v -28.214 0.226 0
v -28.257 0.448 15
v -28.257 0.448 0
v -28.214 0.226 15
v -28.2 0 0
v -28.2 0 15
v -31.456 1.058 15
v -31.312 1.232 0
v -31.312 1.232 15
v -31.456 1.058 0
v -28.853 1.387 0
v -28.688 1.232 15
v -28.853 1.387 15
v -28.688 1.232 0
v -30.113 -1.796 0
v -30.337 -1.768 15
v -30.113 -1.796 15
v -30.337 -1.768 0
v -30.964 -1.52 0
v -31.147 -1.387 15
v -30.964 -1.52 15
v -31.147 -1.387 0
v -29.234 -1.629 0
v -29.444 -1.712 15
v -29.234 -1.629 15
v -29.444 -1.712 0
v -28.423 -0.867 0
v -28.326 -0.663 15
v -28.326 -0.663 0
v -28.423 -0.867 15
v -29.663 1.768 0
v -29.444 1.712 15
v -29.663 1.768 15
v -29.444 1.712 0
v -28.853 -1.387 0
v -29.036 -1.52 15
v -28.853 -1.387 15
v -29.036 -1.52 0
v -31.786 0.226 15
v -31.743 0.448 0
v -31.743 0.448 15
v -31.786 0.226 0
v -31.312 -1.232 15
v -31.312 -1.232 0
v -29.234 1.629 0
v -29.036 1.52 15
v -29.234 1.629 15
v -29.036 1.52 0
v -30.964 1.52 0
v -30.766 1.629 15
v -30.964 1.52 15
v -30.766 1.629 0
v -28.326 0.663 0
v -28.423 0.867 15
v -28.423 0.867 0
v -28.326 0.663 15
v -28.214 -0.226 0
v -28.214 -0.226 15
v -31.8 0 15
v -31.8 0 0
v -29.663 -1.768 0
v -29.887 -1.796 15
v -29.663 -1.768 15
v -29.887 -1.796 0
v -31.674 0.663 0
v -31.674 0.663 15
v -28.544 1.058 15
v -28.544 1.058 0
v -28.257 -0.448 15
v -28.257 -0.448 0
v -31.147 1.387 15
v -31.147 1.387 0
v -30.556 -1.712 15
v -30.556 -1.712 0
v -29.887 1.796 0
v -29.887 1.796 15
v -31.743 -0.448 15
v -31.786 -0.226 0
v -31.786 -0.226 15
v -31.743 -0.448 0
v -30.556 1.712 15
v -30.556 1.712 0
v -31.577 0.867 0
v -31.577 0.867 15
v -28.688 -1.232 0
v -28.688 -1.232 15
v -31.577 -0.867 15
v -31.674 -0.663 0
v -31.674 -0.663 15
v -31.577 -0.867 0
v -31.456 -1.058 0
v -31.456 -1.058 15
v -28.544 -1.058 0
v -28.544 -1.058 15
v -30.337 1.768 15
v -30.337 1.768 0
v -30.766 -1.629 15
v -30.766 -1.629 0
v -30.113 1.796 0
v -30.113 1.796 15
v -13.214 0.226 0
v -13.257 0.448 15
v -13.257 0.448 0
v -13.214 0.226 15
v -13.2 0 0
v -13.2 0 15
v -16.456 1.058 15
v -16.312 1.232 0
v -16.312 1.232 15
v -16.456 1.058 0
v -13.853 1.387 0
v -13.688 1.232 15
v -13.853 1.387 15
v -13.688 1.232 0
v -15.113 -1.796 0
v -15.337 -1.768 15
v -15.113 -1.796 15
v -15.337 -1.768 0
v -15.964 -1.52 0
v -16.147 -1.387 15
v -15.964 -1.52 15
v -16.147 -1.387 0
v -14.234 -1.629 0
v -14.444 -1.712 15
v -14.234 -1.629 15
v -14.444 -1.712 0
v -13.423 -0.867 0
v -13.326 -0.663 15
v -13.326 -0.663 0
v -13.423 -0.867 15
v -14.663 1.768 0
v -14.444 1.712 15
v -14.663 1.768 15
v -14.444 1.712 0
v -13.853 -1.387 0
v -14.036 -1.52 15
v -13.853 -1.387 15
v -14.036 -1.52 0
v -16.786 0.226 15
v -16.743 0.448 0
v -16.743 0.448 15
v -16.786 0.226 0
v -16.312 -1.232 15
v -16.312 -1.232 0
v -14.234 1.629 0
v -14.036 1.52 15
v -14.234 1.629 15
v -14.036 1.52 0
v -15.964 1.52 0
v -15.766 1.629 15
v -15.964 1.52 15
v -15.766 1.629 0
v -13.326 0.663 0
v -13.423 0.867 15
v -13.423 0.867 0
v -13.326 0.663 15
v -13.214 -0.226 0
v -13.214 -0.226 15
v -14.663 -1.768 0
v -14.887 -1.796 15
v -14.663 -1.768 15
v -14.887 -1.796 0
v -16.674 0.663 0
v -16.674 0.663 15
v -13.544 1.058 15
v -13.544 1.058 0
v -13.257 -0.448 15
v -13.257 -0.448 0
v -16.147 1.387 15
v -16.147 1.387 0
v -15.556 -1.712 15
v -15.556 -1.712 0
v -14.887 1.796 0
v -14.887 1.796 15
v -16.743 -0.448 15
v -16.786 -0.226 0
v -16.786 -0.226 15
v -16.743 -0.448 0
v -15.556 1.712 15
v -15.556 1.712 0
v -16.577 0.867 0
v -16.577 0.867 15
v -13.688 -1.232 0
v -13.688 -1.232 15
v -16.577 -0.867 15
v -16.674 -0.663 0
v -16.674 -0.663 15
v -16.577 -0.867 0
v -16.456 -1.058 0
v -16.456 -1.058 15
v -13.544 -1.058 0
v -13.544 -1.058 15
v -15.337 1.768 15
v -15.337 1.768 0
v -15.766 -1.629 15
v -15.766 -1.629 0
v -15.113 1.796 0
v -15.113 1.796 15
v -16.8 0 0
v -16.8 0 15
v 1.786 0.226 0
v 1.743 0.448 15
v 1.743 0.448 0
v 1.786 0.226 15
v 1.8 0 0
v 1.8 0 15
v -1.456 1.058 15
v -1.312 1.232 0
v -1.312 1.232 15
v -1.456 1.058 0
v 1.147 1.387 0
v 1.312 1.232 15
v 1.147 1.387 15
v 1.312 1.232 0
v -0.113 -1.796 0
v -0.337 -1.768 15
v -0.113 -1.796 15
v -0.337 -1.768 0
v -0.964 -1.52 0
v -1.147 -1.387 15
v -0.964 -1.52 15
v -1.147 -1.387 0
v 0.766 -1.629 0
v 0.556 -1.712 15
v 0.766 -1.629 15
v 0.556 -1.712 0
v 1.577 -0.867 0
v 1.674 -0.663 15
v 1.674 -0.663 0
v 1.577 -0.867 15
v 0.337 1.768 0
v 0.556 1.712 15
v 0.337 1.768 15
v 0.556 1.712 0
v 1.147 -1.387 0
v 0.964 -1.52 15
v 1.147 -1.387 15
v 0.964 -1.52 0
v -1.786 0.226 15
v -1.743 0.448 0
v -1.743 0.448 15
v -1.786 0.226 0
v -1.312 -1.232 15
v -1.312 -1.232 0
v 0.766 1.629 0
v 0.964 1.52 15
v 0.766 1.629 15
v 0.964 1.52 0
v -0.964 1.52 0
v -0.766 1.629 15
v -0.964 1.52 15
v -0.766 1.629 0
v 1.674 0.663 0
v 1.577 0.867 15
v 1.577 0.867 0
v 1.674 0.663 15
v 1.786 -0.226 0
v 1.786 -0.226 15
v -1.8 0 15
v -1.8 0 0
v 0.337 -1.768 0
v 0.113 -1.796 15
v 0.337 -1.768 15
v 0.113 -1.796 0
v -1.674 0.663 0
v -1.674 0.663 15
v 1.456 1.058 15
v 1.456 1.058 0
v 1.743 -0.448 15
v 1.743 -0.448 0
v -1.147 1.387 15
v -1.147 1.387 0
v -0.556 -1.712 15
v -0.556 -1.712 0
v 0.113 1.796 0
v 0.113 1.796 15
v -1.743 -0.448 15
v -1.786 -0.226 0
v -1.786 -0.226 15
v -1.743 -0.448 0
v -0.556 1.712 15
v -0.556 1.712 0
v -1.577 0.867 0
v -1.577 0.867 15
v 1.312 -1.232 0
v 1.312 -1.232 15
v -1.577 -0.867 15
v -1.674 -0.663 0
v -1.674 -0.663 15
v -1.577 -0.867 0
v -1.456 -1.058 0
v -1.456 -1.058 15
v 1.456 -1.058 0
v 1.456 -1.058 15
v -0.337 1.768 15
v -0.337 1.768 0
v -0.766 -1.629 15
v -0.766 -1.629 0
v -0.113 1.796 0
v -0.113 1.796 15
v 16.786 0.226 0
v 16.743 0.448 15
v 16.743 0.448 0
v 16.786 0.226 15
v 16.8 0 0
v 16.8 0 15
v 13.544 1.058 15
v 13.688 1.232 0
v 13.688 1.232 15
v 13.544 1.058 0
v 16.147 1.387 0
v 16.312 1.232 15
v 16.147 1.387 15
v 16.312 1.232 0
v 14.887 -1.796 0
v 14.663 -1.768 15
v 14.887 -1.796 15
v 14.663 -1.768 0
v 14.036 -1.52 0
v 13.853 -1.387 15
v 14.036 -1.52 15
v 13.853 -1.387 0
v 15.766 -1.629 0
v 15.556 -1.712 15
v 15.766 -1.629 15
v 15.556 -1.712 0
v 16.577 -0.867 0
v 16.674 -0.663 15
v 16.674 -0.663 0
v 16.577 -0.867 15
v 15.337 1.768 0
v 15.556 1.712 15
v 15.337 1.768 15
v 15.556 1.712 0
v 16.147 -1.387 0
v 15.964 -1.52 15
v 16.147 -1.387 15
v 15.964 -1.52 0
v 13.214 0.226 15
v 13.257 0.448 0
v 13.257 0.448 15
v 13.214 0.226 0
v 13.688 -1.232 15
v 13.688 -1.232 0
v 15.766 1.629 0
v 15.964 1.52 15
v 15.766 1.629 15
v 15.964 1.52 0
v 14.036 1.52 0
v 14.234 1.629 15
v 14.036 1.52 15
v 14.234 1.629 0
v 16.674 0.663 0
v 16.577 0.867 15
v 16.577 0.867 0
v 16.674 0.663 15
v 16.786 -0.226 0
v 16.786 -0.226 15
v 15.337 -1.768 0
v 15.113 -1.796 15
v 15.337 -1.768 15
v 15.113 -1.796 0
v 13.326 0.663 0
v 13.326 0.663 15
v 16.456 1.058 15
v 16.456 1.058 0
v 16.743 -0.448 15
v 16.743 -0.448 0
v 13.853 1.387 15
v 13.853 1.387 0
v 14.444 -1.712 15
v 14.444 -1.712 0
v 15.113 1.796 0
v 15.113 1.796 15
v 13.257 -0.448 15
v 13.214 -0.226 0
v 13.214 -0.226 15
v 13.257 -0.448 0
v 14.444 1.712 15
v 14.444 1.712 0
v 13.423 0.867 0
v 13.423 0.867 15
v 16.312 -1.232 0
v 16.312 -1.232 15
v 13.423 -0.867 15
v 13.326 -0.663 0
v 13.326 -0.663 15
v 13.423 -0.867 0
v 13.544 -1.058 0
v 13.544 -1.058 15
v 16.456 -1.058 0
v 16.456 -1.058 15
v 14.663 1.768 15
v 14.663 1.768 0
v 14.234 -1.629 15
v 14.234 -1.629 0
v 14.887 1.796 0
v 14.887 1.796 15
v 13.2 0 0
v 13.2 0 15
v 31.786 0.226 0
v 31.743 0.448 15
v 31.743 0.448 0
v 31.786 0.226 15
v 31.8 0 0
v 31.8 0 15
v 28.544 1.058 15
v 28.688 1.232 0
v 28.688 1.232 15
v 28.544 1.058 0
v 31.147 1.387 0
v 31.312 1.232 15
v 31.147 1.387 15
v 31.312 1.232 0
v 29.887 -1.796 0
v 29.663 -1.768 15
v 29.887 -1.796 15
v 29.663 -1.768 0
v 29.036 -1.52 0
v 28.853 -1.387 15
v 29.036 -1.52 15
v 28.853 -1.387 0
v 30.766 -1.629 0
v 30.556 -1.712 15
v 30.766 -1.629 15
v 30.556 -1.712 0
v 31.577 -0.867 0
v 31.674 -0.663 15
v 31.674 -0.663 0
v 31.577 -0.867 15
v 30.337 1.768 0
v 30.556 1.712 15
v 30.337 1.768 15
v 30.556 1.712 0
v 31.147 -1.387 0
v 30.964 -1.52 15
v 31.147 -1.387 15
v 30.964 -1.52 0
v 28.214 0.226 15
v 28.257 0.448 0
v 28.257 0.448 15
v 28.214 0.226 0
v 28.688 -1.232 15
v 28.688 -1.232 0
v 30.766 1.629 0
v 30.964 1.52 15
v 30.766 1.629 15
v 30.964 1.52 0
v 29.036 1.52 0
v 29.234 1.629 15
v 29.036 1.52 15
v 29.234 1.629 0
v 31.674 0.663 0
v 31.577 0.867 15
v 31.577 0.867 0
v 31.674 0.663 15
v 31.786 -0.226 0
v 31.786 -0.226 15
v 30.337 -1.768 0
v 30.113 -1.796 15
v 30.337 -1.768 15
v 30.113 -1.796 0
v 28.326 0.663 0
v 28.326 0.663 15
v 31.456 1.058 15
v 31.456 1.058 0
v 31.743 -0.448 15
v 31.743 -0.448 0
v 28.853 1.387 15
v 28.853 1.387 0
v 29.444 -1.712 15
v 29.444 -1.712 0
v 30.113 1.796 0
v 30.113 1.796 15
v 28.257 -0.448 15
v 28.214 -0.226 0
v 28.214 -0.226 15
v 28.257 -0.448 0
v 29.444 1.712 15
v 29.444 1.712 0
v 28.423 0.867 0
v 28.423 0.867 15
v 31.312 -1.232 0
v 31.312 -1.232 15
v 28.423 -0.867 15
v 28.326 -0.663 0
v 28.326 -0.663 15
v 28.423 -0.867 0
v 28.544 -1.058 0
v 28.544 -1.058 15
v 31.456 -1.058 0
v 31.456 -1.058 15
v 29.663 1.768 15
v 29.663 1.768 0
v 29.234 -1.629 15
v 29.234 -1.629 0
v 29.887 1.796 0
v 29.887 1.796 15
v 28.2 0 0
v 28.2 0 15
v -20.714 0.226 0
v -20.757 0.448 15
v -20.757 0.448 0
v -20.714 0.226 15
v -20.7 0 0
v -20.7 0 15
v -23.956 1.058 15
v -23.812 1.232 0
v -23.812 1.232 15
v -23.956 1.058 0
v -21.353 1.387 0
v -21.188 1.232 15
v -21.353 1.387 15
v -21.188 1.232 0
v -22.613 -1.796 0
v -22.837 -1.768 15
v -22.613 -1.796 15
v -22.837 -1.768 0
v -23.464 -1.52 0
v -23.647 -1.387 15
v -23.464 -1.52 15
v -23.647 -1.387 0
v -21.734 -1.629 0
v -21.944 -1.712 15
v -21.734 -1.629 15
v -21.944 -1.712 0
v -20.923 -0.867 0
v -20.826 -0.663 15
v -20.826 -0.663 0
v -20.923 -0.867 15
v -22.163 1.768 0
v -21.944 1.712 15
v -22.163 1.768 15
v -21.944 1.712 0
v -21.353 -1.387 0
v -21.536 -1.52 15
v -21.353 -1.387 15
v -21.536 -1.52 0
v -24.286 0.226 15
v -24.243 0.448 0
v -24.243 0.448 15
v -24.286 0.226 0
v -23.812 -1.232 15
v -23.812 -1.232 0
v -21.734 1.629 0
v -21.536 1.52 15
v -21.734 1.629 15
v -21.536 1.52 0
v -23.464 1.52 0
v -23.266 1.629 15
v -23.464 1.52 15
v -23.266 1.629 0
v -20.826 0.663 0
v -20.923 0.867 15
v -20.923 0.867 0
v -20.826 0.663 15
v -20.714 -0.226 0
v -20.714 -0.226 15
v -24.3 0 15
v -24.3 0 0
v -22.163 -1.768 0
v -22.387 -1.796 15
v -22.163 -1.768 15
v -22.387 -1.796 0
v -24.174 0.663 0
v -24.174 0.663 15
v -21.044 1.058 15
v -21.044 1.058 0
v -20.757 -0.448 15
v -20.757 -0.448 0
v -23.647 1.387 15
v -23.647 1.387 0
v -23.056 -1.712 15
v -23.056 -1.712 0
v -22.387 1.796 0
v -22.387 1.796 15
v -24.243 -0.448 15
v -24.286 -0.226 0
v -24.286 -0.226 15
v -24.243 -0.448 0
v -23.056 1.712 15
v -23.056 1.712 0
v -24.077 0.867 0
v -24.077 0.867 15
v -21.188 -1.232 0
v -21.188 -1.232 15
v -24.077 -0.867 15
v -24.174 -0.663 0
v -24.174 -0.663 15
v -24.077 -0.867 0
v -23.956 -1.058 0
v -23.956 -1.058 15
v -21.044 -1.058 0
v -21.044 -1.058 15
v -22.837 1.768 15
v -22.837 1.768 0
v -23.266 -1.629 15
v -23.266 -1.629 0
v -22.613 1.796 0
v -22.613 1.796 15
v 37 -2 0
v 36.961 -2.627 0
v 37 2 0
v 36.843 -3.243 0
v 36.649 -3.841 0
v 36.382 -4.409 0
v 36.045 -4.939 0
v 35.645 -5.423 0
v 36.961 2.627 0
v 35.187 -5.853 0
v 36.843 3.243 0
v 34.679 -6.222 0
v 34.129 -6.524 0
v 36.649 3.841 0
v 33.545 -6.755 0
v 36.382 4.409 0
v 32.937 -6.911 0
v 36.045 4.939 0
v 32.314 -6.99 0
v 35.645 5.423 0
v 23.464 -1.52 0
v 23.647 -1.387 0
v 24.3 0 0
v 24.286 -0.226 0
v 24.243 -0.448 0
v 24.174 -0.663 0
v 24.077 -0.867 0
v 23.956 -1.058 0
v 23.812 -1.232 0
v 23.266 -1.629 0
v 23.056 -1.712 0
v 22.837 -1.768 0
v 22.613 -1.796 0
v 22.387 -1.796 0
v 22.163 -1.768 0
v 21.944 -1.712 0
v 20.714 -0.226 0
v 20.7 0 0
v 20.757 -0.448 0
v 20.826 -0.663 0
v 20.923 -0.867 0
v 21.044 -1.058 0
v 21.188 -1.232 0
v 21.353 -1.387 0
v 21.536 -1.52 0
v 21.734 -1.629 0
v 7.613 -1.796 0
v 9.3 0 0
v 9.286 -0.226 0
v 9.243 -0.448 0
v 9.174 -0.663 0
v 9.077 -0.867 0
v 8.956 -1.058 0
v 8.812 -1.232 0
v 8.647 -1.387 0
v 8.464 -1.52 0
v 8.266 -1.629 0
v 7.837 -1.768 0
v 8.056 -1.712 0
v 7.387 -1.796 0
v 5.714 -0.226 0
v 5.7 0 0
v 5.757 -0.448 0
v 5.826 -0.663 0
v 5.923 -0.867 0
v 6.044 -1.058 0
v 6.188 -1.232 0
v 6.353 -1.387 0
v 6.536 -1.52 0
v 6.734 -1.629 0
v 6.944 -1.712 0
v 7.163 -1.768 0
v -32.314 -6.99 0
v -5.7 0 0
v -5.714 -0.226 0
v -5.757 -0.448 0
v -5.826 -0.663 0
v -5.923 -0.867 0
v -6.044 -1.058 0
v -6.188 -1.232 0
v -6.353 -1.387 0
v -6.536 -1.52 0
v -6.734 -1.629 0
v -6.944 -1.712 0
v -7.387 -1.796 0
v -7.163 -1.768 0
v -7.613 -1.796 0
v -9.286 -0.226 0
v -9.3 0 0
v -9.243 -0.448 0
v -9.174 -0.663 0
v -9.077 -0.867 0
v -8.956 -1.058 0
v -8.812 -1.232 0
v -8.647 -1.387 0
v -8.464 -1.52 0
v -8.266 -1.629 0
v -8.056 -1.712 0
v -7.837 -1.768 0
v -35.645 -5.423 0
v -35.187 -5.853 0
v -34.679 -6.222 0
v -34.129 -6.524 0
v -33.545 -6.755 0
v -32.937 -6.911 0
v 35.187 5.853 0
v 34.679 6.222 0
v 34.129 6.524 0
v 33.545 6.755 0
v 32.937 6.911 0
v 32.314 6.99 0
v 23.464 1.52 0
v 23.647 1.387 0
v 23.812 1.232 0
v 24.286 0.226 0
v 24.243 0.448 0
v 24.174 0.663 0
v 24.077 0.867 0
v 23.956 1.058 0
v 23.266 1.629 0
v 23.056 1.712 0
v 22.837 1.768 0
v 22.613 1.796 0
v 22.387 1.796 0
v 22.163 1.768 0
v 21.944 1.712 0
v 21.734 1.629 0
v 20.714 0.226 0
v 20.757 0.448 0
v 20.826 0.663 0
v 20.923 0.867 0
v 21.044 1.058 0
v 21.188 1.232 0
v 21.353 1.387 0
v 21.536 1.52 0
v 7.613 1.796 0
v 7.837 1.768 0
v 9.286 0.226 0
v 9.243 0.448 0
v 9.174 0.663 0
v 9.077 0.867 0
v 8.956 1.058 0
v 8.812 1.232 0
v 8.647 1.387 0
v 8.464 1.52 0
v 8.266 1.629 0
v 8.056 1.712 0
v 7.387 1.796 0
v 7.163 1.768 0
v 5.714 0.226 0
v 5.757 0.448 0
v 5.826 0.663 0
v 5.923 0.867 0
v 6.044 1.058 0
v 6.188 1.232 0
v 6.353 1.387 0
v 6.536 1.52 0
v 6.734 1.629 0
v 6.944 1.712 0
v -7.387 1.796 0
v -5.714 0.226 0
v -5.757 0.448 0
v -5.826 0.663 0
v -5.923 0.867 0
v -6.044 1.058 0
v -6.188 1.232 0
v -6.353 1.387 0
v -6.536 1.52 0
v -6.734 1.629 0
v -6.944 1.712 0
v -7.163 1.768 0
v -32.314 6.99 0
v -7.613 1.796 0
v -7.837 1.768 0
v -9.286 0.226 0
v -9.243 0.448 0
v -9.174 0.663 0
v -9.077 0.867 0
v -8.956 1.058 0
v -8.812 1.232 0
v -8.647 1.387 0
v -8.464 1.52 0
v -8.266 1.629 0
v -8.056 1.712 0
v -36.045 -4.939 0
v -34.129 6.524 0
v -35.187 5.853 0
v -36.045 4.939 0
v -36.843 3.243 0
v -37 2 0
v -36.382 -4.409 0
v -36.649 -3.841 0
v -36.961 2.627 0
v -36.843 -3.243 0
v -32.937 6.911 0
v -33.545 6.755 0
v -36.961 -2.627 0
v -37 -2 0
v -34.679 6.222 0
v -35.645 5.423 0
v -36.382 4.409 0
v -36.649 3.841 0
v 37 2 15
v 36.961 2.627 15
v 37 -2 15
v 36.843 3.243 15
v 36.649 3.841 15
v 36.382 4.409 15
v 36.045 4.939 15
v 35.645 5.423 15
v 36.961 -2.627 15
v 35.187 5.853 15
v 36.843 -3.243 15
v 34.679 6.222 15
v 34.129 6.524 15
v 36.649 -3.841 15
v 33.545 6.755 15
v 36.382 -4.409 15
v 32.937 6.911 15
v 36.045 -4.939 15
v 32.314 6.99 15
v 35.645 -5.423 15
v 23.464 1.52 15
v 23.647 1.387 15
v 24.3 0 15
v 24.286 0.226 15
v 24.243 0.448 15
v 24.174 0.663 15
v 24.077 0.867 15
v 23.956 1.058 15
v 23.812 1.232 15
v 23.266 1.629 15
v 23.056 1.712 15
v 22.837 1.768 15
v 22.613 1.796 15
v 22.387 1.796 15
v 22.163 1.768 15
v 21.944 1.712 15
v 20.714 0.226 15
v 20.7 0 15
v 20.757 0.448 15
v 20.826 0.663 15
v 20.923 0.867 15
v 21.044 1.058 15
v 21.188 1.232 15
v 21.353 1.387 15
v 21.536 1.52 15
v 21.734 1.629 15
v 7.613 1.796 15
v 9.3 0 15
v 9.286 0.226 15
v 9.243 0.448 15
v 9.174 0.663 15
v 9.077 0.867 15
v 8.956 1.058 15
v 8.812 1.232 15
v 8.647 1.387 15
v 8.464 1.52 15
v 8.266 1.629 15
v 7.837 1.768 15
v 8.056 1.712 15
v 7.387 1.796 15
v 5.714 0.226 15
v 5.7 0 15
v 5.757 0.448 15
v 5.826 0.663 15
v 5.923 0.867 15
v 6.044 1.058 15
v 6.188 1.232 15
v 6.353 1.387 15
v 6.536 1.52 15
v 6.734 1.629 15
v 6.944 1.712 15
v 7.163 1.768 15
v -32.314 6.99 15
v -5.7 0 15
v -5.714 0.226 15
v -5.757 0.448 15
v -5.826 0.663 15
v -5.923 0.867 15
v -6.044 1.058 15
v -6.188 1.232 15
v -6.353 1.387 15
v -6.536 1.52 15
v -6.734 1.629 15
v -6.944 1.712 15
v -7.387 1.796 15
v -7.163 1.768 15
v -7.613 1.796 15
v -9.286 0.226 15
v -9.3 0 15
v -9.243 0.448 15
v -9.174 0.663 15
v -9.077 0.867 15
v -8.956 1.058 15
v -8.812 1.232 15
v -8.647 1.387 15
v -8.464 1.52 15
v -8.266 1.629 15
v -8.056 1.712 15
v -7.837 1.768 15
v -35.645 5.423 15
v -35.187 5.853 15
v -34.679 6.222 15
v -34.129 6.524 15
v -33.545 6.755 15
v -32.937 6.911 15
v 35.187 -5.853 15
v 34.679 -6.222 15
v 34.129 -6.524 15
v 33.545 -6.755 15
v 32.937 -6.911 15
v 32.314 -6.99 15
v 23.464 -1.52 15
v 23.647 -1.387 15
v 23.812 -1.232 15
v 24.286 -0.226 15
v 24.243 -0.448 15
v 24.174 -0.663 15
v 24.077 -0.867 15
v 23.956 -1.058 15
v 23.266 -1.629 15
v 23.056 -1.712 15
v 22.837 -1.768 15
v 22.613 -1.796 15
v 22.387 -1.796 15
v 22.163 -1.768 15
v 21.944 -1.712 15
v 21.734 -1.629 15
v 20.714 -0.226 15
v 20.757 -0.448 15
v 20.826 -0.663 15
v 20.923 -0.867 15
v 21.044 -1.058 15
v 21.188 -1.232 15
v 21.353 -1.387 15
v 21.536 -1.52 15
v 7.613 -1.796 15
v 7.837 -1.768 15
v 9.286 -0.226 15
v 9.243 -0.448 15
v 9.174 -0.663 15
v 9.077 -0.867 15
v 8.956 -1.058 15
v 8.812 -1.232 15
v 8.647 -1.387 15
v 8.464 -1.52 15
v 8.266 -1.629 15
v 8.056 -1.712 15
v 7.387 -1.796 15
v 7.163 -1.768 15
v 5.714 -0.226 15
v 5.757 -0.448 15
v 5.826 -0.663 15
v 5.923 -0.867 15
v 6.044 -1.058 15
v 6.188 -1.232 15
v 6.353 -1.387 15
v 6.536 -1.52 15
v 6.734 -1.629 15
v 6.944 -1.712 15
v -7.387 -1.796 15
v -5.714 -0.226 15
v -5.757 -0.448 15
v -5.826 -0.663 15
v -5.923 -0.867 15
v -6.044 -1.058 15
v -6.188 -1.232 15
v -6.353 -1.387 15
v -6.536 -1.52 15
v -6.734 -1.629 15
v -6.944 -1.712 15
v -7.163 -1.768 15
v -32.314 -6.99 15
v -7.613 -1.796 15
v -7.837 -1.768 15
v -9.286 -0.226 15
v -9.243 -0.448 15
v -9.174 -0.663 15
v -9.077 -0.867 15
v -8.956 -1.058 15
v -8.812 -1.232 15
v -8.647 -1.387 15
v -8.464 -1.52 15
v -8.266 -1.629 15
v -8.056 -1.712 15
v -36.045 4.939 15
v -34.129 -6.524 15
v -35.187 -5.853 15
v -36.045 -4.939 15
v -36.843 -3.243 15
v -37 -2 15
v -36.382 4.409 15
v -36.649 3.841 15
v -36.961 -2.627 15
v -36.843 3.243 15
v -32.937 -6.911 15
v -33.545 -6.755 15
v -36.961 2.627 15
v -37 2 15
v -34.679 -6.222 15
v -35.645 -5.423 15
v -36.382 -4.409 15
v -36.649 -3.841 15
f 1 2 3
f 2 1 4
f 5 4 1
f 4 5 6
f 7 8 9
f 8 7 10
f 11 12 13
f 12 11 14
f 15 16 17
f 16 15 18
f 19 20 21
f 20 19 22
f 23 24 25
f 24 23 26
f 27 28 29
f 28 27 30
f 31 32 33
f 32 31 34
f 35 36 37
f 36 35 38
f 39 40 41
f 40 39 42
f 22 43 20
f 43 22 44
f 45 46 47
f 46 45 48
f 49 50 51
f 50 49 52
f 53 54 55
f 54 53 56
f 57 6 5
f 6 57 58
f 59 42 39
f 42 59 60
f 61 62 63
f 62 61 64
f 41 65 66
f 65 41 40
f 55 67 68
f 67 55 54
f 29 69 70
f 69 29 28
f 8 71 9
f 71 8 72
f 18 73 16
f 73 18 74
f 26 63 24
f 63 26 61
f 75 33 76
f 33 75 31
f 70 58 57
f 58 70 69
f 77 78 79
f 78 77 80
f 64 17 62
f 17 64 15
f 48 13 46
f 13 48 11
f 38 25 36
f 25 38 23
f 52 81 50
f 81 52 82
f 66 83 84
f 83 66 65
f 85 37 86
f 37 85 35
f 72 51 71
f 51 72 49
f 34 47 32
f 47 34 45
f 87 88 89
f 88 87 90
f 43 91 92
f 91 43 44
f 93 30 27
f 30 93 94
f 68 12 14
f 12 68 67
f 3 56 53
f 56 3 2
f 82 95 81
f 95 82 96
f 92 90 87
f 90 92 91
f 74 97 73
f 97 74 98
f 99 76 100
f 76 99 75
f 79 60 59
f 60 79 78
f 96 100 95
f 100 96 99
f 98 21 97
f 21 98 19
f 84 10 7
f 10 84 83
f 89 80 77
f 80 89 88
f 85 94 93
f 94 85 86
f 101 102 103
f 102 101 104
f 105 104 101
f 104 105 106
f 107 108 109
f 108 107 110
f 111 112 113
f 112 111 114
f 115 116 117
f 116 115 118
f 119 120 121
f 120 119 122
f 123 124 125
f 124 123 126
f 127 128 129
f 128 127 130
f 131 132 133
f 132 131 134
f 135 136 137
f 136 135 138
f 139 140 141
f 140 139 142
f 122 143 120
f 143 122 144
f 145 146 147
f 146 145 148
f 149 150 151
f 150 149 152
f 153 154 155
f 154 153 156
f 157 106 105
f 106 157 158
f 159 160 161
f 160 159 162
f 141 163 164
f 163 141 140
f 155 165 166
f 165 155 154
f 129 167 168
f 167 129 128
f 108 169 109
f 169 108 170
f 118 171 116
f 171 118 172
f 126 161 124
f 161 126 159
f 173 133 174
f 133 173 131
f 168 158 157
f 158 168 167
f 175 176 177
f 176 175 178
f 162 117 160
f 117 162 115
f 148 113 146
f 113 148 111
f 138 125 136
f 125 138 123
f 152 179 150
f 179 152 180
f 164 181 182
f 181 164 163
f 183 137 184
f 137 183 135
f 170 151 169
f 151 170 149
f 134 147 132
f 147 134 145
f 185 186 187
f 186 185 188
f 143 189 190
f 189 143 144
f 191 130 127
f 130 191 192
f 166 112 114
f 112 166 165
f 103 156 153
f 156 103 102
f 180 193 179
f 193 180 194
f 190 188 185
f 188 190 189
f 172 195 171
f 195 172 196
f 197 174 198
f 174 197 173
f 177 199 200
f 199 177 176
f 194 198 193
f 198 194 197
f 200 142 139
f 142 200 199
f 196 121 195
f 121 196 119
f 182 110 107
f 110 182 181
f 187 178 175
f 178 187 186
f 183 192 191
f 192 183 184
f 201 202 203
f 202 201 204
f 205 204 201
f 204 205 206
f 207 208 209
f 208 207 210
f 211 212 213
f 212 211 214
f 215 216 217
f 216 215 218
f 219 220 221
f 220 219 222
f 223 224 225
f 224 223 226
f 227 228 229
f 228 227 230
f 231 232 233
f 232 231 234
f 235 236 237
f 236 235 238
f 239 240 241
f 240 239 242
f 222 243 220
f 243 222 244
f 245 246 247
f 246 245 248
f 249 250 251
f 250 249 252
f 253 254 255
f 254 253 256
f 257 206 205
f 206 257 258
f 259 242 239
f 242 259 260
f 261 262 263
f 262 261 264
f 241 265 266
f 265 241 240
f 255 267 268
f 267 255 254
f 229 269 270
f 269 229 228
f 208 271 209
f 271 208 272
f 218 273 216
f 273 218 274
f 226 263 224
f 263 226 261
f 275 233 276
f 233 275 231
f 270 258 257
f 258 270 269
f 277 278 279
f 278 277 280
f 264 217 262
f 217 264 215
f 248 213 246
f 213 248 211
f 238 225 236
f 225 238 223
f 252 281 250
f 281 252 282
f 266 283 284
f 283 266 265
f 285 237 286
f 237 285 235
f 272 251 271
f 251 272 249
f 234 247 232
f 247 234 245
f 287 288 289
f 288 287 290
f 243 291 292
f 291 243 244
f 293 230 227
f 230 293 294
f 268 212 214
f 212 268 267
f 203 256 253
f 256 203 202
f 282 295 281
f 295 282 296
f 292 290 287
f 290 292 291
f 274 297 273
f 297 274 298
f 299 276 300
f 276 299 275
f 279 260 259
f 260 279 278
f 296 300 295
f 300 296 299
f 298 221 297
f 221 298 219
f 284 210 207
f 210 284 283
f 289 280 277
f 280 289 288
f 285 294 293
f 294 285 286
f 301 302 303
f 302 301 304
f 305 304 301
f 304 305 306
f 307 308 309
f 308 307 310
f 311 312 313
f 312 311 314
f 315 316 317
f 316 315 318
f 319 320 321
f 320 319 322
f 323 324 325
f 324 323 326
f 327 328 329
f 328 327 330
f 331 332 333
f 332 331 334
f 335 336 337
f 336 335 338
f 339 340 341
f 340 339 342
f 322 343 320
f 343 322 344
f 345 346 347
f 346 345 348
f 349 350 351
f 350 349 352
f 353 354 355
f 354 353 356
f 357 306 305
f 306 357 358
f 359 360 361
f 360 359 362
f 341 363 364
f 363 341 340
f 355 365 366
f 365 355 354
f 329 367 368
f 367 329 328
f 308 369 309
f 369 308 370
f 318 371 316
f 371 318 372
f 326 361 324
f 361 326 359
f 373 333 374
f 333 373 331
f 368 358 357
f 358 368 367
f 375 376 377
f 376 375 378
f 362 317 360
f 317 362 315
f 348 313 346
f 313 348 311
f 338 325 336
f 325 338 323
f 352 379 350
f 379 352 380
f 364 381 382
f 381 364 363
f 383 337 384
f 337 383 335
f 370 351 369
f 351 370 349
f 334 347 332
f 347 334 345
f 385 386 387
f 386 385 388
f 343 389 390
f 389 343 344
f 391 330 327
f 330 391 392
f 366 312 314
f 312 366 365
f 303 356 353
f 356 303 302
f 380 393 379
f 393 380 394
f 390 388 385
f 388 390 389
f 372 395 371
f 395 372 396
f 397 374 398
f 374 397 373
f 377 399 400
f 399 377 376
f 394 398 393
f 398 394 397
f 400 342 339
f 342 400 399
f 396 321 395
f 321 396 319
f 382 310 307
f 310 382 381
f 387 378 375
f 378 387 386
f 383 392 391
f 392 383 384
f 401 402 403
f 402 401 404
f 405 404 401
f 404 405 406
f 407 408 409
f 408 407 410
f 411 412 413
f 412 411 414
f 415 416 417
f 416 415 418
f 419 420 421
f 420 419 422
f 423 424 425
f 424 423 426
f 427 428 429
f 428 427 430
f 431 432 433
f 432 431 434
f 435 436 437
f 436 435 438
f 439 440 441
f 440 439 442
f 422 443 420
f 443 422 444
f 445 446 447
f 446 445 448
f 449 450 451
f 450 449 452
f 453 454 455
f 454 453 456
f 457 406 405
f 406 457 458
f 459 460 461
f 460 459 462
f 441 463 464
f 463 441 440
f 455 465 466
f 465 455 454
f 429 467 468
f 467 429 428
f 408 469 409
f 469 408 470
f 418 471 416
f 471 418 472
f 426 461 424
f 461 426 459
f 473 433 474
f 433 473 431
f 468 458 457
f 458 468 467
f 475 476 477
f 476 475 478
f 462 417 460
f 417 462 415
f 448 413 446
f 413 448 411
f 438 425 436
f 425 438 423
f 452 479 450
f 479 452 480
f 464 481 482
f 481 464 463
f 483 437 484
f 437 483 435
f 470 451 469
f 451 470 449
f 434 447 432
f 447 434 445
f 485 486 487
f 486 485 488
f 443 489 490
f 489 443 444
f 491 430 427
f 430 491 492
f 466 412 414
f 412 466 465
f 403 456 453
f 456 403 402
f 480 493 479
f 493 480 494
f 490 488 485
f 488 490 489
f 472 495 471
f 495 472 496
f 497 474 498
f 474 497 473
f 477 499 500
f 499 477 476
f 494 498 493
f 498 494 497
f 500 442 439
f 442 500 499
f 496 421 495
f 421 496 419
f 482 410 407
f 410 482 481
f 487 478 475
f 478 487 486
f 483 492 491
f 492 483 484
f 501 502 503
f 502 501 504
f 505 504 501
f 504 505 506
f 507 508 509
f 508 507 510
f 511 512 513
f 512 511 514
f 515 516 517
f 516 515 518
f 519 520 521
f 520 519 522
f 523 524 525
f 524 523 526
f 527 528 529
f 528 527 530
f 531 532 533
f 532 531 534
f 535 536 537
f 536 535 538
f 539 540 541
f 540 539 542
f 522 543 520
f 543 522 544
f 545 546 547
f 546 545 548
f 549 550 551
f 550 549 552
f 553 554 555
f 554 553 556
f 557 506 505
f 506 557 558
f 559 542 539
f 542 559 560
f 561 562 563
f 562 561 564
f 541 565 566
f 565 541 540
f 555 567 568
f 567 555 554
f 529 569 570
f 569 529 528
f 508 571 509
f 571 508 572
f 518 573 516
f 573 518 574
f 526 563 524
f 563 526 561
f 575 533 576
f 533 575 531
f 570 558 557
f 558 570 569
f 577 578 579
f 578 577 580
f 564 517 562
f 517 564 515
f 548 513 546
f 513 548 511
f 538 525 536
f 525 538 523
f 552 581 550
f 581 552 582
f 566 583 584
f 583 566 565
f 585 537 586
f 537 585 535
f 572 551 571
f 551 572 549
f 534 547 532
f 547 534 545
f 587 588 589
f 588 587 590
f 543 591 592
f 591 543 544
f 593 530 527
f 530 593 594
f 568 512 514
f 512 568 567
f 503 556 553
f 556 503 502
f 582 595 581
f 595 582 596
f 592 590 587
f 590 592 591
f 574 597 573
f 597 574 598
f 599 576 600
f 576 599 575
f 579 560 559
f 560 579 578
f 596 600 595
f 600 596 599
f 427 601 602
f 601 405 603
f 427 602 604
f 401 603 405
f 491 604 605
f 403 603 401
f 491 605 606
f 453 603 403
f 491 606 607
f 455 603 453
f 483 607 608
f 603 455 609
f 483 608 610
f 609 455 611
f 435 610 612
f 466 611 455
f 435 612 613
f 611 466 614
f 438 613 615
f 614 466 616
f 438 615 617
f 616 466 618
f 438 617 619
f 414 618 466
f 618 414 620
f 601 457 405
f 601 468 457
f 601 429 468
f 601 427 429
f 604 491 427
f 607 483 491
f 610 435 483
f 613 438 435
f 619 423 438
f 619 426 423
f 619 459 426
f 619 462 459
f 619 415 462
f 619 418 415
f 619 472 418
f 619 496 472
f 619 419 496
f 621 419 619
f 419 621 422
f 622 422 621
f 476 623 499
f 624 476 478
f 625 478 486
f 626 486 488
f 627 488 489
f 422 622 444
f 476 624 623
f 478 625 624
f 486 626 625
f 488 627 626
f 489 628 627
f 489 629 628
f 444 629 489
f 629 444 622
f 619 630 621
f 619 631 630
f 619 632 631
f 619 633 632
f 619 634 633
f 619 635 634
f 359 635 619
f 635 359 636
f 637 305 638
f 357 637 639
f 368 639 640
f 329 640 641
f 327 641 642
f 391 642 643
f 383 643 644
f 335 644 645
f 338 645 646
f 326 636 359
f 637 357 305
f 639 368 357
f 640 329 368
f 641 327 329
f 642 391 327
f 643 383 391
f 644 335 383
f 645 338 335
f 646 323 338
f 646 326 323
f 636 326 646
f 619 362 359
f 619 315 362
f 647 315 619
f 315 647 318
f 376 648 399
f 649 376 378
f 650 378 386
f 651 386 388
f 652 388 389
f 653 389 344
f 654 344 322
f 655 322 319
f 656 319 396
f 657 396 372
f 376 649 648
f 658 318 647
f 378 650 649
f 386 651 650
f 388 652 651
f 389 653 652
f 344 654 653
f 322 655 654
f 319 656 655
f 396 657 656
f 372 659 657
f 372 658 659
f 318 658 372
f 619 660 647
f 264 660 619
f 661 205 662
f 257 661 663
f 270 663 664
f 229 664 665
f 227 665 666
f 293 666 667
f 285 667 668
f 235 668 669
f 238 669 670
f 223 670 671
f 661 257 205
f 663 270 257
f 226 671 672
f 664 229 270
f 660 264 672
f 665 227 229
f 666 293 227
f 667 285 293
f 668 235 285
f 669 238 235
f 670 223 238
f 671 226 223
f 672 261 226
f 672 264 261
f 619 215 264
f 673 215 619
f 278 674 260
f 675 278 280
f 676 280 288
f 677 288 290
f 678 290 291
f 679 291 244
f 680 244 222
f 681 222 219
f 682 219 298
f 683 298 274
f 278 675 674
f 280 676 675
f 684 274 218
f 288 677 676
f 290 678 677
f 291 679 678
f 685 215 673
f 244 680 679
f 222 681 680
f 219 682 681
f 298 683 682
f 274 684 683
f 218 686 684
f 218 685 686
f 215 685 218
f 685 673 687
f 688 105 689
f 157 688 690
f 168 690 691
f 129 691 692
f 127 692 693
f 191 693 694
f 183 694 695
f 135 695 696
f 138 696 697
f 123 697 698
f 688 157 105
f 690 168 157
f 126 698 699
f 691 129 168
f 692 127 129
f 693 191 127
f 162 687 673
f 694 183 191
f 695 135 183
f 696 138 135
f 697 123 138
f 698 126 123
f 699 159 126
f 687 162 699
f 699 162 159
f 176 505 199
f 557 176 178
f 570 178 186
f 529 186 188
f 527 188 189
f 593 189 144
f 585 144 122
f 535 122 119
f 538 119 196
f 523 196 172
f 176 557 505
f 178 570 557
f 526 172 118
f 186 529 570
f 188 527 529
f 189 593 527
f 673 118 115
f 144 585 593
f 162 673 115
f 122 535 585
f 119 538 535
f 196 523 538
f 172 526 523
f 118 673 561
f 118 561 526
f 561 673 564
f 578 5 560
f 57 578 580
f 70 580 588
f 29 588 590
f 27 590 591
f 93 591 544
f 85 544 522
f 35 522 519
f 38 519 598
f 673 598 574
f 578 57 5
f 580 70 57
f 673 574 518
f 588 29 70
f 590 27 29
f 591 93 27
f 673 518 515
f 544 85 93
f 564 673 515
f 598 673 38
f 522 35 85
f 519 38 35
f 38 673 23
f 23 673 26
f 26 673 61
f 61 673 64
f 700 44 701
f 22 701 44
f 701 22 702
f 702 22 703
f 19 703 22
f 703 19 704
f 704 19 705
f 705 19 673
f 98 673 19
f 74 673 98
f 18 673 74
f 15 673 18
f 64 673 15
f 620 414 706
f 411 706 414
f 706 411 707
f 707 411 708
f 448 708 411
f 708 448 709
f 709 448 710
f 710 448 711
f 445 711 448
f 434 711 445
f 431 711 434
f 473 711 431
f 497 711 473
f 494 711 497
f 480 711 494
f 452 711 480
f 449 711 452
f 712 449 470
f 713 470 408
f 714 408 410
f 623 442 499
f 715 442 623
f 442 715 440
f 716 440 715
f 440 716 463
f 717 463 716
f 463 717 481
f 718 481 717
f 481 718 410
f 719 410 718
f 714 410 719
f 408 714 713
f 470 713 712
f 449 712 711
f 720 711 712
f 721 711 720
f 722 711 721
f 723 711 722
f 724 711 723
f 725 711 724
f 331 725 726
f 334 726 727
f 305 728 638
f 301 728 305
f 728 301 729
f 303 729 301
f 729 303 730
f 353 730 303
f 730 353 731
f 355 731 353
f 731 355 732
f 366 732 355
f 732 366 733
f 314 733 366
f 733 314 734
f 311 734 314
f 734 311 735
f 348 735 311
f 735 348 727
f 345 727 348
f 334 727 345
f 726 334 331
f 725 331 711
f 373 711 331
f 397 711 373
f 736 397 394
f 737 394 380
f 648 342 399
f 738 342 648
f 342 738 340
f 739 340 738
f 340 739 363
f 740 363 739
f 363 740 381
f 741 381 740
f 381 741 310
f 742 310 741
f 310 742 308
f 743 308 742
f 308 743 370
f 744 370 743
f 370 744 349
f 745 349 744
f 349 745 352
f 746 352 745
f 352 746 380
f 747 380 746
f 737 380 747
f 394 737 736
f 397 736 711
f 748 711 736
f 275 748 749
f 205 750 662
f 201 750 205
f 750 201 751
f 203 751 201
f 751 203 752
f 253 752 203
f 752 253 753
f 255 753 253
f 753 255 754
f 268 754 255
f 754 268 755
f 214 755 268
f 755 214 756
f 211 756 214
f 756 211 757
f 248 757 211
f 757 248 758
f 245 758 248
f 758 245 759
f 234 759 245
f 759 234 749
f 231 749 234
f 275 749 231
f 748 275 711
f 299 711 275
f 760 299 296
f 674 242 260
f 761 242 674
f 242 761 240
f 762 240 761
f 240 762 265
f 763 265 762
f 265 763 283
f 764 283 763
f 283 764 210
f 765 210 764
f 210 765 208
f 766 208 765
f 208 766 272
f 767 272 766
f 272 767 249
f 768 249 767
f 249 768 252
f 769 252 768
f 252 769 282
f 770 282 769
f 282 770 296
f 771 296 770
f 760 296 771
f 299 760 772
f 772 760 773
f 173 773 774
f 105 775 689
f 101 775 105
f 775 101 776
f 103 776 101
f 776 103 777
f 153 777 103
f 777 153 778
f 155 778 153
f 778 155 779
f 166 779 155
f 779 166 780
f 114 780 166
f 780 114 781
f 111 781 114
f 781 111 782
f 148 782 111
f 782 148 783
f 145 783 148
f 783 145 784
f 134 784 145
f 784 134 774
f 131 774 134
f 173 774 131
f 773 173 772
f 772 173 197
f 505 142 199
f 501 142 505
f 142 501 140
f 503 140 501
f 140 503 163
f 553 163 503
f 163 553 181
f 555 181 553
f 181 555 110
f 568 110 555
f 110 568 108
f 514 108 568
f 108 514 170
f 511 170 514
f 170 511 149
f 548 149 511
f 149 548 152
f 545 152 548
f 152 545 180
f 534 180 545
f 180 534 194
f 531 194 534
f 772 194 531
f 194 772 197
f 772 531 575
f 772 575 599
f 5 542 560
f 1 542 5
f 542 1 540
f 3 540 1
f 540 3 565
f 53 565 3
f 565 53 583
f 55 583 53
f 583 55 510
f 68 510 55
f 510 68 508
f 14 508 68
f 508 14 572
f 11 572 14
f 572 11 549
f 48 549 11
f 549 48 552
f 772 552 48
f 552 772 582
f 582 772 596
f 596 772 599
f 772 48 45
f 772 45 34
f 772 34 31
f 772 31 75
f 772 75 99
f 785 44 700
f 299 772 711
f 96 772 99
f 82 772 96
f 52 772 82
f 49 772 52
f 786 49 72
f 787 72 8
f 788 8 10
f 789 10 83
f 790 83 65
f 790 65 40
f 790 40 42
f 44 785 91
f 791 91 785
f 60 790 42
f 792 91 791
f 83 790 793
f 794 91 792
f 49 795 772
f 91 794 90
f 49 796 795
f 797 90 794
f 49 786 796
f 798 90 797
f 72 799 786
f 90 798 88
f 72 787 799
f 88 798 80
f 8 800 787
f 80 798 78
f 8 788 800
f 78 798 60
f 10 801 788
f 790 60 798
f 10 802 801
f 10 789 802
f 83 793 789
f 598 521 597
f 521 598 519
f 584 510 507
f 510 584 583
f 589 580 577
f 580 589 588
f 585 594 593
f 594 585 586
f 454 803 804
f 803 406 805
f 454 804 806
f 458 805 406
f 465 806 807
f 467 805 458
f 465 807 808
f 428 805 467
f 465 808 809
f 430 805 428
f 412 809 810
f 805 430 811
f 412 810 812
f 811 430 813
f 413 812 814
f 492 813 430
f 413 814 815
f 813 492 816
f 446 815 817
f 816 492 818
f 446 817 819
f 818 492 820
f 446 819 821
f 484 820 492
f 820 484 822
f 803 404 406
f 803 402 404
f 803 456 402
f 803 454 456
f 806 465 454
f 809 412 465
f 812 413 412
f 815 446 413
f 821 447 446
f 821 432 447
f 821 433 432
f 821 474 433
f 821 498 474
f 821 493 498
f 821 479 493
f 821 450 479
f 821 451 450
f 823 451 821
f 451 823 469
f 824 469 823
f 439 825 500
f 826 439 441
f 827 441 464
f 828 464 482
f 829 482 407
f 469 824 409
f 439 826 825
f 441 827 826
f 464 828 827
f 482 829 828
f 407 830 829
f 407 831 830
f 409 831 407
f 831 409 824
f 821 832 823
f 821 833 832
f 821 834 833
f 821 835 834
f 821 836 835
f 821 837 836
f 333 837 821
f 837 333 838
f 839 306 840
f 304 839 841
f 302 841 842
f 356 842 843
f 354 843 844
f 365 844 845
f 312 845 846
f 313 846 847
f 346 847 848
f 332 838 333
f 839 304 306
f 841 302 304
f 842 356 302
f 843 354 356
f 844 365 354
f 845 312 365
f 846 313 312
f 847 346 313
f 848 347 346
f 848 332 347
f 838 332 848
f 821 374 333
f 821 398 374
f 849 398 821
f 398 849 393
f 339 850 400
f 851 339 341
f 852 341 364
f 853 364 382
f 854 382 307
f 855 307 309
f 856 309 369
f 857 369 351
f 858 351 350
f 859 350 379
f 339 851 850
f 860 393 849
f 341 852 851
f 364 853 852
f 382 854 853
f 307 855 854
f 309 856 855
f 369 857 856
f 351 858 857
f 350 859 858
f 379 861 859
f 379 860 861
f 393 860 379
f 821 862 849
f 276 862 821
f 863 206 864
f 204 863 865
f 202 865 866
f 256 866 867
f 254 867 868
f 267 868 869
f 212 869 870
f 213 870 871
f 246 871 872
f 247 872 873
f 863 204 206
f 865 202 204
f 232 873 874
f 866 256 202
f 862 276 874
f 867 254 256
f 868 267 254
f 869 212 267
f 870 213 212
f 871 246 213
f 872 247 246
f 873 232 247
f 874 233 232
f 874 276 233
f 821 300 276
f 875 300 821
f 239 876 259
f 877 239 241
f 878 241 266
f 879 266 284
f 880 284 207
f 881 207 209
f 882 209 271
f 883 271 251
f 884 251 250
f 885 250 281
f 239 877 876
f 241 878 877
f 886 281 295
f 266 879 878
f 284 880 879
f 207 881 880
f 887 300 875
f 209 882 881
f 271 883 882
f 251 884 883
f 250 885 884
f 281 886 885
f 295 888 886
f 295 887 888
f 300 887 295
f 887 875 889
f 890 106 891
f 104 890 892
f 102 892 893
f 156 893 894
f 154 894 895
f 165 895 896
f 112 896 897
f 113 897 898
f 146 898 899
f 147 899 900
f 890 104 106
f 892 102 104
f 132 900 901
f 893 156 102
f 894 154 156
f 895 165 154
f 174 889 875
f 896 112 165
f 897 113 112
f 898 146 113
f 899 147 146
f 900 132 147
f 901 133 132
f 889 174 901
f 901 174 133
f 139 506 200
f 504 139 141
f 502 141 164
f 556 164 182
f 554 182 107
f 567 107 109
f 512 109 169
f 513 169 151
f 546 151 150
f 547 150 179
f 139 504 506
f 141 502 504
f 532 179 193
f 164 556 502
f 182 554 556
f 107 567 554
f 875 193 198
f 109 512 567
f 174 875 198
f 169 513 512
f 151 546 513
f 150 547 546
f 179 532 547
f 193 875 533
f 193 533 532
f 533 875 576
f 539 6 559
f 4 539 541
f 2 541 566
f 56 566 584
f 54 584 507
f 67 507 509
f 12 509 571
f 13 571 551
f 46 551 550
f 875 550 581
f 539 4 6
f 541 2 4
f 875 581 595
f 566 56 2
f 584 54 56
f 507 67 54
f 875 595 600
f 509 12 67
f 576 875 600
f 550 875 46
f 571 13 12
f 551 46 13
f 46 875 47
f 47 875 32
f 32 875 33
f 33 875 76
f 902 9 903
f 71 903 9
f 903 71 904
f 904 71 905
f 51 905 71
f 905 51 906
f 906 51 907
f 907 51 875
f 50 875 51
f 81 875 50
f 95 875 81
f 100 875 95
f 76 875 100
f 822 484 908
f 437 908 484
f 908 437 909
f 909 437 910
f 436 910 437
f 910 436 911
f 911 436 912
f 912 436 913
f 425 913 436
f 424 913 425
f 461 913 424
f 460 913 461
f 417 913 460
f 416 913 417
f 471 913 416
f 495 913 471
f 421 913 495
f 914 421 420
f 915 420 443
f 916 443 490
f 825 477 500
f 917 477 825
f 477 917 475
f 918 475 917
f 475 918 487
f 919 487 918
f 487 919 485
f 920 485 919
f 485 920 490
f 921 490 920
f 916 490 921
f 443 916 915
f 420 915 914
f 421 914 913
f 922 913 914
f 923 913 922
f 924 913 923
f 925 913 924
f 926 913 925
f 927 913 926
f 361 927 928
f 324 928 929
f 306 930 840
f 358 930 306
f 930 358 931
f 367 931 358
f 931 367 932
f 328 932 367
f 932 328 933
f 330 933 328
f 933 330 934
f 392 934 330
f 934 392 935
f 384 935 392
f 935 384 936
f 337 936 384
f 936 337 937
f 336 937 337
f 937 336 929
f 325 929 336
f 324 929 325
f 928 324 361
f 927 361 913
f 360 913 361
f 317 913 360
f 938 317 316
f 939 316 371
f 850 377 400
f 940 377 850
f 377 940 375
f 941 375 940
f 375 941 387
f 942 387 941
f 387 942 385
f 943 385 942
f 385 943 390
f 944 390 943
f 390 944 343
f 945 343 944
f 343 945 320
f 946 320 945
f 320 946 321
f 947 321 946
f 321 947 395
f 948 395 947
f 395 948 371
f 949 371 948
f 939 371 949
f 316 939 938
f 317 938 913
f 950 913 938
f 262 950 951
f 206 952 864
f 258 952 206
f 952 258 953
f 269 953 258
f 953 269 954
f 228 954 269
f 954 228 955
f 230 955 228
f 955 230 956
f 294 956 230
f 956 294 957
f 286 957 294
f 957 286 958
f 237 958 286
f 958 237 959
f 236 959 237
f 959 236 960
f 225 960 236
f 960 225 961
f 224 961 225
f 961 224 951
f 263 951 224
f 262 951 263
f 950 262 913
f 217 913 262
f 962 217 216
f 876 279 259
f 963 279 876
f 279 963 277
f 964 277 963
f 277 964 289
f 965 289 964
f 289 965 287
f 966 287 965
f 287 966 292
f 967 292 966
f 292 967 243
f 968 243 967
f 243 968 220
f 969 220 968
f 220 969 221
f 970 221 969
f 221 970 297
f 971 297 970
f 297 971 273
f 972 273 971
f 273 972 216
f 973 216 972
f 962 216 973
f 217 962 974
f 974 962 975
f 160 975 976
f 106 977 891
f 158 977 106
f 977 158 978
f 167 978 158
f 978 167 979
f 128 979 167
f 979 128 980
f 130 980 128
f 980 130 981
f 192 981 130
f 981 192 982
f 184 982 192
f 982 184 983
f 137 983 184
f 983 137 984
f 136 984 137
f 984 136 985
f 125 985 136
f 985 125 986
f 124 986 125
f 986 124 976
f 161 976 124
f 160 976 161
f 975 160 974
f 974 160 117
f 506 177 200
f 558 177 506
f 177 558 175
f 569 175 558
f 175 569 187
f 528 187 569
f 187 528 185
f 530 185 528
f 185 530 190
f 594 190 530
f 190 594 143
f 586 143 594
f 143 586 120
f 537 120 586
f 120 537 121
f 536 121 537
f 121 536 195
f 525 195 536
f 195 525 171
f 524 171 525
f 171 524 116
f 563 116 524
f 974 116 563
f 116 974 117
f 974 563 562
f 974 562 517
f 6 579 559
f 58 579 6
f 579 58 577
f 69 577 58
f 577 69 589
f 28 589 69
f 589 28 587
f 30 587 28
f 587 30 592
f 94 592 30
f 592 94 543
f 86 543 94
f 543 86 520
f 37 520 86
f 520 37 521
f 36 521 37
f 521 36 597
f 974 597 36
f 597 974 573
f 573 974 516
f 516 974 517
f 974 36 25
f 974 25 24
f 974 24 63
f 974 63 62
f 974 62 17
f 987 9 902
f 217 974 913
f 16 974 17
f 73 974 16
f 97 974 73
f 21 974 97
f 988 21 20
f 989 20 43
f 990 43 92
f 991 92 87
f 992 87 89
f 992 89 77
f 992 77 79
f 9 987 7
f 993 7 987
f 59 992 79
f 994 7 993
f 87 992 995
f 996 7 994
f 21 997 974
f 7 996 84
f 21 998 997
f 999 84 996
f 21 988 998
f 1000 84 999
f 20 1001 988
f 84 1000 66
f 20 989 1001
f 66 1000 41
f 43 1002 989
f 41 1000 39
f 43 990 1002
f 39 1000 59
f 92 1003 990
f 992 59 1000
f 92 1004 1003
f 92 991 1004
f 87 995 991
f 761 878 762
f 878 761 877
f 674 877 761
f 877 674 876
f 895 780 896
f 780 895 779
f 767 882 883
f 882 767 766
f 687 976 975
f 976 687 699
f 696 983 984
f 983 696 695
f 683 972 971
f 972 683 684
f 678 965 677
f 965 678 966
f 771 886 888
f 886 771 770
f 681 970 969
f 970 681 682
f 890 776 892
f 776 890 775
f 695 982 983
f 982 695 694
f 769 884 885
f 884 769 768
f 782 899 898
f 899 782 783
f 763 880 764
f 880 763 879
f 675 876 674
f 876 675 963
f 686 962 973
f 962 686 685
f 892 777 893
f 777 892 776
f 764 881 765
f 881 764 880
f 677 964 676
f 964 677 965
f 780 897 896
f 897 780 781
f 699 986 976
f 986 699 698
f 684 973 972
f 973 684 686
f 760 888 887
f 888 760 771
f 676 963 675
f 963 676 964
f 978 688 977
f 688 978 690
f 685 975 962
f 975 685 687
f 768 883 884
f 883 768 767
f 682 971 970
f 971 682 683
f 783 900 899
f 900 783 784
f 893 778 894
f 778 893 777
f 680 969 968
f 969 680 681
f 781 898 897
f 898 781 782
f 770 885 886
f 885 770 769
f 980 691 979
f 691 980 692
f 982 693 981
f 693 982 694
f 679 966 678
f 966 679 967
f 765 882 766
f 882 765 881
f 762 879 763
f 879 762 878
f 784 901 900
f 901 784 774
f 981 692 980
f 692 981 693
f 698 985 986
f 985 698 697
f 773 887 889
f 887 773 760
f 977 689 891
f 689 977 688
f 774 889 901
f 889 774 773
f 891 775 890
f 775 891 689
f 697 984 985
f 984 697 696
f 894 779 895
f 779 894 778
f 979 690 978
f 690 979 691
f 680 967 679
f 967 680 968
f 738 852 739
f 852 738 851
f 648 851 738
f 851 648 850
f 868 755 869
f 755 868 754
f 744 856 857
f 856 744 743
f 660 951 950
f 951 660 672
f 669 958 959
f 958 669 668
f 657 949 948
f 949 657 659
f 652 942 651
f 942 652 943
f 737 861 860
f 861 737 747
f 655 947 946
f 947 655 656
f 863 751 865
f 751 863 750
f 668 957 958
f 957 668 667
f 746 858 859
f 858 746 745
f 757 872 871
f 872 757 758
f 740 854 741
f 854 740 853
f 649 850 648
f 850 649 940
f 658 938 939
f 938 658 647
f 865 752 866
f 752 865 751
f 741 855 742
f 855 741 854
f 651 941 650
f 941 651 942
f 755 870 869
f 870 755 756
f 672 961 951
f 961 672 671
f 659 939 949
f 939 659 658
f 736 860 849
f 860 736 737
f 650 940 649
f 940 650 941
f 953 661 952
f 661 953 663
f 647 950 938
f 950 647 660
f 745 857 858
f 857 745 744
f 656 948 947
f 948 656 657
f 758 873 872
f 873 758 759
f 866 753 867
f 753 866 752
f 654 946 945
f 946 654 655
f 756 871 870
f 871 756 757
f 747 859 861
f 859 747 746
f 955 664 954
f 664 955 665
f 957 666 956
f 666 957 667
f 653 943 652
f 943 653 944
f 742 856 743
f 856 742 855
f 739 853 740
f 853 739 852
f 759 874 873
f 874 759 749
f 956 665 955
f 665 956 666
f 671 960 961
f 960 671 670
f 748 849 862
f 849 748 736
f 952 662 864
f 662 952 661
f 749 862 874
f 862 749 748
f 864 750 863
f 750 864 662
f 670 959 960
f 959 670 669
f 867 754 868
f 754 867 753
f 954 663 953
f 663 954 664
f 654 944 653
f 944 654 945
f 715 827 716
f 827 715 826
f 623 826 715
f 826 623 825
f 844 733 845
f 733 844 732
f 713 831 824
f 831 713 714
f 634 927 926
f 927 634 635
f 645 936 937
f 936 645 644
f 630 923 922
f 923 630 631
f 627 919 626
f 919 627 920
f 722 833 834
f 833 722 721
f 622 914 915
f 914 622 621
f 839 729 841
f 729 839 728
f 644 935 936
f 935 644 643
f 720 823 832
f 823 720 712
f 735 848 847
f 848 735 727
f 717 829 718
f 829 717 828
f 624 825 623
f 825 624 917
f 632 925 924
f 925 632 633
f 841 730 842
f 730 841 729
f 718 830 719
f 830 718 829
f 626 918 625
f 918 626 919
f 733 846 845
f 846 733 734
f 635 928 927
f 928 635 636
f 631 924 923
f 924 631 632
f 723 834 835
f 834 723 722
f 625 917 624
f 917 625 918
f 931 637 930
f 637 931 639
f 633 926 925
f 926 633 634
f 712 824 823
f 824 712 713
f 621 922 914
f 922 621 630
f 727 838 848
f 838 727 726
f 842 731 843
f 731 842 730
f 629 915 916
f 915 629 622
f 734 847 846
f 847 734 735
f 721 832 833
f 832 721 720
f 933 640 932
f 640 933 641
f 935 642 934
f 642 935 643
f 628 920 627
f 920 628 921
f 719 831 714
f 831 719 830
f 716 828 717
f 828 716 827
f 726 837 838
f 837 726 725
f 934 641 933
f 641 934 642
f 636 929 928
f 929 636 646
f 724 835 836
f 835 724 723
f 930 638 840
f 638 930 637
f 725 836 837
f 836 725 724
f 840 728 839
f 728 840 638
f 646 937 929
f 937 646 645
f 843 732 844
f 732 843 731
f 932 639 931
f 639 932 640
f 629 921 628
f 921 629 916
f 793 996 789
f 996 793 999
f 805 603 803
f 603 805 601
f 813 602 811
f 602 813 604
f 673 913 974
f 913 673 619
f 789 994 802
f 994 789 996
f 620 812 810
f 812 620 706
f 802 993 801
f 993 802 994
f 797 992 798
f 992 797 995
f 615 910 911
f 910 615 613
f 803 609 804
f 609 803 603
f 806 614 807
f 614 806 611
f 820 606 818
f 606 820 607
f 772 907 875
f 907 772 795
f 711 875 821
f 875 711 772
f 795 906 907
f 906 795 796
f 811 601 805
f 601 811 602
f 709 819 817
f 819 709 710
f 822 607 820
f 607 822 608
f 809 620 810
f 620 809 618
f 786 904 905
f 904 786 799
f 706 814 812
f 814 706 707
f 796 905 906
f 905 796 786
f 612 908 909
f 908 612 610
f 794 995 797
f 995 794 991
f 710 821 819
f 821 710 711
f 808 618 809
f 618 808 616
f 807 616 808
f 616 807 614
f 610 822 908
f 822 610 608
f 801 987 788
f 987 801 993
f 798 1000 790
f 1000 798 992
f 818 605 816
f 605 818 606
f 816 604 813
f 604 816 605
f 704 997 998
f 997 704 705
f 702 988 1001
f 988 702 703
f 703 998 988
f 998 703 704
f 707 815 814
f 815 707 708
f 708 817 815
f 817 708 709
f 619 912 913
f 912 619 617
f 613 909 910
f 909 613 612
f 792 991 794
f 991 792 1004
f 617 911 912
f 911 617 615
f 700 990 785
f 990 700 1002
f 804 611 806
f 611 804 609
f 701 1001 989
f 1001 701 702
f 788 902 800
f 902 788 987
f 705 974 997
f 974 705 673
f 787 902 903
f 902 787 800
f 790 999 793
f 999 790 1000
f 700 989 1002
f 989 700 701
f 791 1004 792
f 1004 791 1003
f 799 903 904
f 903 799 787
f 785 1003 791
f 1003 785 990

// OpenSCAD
$fn = 50;


difference() {
	union() {
		hull() {
			translate(v = [-32.0000000000, 2.0000000000, 0]) {
				cylinder(h = 15, r = 5);
			}
			translate(v = [32.0000000000, 2.0000000000, 0]) {
				cylinder(h = 15, r = 5);
			}
			translate(v = [-32.0000000000, -2.0000000000, 0]) {
				cylinder(h = 15, r = 5);
			}
			translate(v = [32.0000000000, -2.0000000000, 0]) {
				cylinder(h = 15, r = 5);
			}
		}
	}
	union() {
		translate(v = [-30.0000000000, 0.0000000000, -100.0000000000]) {
			cylinder(h = 200, r = 1.8000000000);
		}
		translate(v = [-15.0000000000, 0.0000000000, -100.0000000000]) {
			cylinder(h = 200, r = 1.8000000000);
		}
		translate(v = [0.0000000000, 0.0000000000, -100.0000000000]) {
			cylinder(h = 200, r = 1.8000000000);
		}
		translate(v = [15.0000000000, 0.0000000000, -100.0000000000]) {
			cylinder(h = 200, r = 1.8000000000);
		}
		translate(v = [30.0000000000, 0.0000000000, -100.0000000000]) {
			cylinder(h = 200, r = 1.8000000000);
		}
		translate(v = [-30.0000000000, 0.0000000000, 0]) {
			cylinder(h = 15, r = 1.8000000000);
		}
		translate(v = [-22.5000000000, 0.0000000000, 0]) {
			cylinder(h = 15, r = 1.8000000000);
		}
		translate(v = [-15.0000000000, 0.0000000000, 0]) {
			cylinder(h = 15, r = 1.8000000000);
		}
		translate(v = [-7.5000000000, 0.0000000000, 0]) {
			cylinder(h = 15, r = 1.8000000000);
		}
		cylinder(h = 15, r = 1.8000000000);
		translate(v = [7.5000000000, 0.0000000000, 0]) {
			cylinder(h = 15, r = 1.8000000000);
		}
		translate(v = [15.0000000000, 0.0000000000, 0]) {
			cylinder(h = 15, r = 1.8000000000);
		}
		translate(v = [22.5000000000, 0.0000000000, 0]) {
			cylinder(h = 15, r = 1.8000000000);
		}
		translate(v = [30.0000000000, 0.0000000000, 0]) {
			cylinder(h = 15, r = 1.8000000000);
		}
		translate(v = [-30.0000000000, 0.0000000000, 0]) {
			cylinder(h = 15, r = 1.8000000000);
		}
		translate(v = [-22.5000000000, 0.0000000000, 0]) {
			cylinder(h = 15, r = 1.8000000000);
		}
		translate(v = [-15.0000000000, 0.0000000000, 0]) {
			cylinder(h = 15, r = 1.8000000000);
		}
		translate(v = [-7.5000000000, 0.0000000000, 0]) {
			cylinder(h = 15, r = 1.8000000000);
		}
		cylinder(h = 15, r = 1.8000000000);
		translate(v = [7.5000000000, 0.0000000000, 0]) {
			cylinder(h = 15, r = 1.8000000000);
		}
		translate(v = [15.0000000000, 0.0000000000, 0]) {
			cylinder(h = 15, r = 1.8000000000);
		}
		translate(v = [22.5000000000, 0.0000000000, 0]) {
			cylinder(h = 15, r = 1.8000000000);
		}
		translate(v = [30.0000000000, 0.0000000000, 0]) {
			cylinder(h = 15, r = 1.8000000000);
		}
		translate(v = [-30.0000000000, 0.0000000000, 0]) {
			cylinder(h = 15, r = 1.8000000000);
		}
		translate(v = [-22.5000000000, 0.0000000000, 0]) {
			cylinder(h = 15, r = 1.8000000000);
		}
		translate(v = [-15.0000000000, 0.0000000000, 0]) {
			cylinder(h = 15, r = 1.8000000000);
		}
		translate(v = [-7.5000000000, 0.0000000000, 0]) {
			cylinder(h = 15, r = 1.8000000000);
		}
		cylinder(h = 15, r = 1.8000000000);
		translate(v = [7.5000000000, 0.0000000000, 0]) {
			cylinder(h = 15, r = 1.8000000000);
		}
		translate(v = [15.0000000000, 0.0000000000, 0]) {
			cylinder(h = 15, r = 1.8000000000);
		}
		translate(v = [22.5000000000, 0.0000000000, 0]) {
			cylinder(h = 15, r = 1.8000000000);
		}
		translate(v = [30.0000000000, 0.0000000000, 0]) {
			cylinder(h = 15, r = 1.8000000000);
		}
	}
}
